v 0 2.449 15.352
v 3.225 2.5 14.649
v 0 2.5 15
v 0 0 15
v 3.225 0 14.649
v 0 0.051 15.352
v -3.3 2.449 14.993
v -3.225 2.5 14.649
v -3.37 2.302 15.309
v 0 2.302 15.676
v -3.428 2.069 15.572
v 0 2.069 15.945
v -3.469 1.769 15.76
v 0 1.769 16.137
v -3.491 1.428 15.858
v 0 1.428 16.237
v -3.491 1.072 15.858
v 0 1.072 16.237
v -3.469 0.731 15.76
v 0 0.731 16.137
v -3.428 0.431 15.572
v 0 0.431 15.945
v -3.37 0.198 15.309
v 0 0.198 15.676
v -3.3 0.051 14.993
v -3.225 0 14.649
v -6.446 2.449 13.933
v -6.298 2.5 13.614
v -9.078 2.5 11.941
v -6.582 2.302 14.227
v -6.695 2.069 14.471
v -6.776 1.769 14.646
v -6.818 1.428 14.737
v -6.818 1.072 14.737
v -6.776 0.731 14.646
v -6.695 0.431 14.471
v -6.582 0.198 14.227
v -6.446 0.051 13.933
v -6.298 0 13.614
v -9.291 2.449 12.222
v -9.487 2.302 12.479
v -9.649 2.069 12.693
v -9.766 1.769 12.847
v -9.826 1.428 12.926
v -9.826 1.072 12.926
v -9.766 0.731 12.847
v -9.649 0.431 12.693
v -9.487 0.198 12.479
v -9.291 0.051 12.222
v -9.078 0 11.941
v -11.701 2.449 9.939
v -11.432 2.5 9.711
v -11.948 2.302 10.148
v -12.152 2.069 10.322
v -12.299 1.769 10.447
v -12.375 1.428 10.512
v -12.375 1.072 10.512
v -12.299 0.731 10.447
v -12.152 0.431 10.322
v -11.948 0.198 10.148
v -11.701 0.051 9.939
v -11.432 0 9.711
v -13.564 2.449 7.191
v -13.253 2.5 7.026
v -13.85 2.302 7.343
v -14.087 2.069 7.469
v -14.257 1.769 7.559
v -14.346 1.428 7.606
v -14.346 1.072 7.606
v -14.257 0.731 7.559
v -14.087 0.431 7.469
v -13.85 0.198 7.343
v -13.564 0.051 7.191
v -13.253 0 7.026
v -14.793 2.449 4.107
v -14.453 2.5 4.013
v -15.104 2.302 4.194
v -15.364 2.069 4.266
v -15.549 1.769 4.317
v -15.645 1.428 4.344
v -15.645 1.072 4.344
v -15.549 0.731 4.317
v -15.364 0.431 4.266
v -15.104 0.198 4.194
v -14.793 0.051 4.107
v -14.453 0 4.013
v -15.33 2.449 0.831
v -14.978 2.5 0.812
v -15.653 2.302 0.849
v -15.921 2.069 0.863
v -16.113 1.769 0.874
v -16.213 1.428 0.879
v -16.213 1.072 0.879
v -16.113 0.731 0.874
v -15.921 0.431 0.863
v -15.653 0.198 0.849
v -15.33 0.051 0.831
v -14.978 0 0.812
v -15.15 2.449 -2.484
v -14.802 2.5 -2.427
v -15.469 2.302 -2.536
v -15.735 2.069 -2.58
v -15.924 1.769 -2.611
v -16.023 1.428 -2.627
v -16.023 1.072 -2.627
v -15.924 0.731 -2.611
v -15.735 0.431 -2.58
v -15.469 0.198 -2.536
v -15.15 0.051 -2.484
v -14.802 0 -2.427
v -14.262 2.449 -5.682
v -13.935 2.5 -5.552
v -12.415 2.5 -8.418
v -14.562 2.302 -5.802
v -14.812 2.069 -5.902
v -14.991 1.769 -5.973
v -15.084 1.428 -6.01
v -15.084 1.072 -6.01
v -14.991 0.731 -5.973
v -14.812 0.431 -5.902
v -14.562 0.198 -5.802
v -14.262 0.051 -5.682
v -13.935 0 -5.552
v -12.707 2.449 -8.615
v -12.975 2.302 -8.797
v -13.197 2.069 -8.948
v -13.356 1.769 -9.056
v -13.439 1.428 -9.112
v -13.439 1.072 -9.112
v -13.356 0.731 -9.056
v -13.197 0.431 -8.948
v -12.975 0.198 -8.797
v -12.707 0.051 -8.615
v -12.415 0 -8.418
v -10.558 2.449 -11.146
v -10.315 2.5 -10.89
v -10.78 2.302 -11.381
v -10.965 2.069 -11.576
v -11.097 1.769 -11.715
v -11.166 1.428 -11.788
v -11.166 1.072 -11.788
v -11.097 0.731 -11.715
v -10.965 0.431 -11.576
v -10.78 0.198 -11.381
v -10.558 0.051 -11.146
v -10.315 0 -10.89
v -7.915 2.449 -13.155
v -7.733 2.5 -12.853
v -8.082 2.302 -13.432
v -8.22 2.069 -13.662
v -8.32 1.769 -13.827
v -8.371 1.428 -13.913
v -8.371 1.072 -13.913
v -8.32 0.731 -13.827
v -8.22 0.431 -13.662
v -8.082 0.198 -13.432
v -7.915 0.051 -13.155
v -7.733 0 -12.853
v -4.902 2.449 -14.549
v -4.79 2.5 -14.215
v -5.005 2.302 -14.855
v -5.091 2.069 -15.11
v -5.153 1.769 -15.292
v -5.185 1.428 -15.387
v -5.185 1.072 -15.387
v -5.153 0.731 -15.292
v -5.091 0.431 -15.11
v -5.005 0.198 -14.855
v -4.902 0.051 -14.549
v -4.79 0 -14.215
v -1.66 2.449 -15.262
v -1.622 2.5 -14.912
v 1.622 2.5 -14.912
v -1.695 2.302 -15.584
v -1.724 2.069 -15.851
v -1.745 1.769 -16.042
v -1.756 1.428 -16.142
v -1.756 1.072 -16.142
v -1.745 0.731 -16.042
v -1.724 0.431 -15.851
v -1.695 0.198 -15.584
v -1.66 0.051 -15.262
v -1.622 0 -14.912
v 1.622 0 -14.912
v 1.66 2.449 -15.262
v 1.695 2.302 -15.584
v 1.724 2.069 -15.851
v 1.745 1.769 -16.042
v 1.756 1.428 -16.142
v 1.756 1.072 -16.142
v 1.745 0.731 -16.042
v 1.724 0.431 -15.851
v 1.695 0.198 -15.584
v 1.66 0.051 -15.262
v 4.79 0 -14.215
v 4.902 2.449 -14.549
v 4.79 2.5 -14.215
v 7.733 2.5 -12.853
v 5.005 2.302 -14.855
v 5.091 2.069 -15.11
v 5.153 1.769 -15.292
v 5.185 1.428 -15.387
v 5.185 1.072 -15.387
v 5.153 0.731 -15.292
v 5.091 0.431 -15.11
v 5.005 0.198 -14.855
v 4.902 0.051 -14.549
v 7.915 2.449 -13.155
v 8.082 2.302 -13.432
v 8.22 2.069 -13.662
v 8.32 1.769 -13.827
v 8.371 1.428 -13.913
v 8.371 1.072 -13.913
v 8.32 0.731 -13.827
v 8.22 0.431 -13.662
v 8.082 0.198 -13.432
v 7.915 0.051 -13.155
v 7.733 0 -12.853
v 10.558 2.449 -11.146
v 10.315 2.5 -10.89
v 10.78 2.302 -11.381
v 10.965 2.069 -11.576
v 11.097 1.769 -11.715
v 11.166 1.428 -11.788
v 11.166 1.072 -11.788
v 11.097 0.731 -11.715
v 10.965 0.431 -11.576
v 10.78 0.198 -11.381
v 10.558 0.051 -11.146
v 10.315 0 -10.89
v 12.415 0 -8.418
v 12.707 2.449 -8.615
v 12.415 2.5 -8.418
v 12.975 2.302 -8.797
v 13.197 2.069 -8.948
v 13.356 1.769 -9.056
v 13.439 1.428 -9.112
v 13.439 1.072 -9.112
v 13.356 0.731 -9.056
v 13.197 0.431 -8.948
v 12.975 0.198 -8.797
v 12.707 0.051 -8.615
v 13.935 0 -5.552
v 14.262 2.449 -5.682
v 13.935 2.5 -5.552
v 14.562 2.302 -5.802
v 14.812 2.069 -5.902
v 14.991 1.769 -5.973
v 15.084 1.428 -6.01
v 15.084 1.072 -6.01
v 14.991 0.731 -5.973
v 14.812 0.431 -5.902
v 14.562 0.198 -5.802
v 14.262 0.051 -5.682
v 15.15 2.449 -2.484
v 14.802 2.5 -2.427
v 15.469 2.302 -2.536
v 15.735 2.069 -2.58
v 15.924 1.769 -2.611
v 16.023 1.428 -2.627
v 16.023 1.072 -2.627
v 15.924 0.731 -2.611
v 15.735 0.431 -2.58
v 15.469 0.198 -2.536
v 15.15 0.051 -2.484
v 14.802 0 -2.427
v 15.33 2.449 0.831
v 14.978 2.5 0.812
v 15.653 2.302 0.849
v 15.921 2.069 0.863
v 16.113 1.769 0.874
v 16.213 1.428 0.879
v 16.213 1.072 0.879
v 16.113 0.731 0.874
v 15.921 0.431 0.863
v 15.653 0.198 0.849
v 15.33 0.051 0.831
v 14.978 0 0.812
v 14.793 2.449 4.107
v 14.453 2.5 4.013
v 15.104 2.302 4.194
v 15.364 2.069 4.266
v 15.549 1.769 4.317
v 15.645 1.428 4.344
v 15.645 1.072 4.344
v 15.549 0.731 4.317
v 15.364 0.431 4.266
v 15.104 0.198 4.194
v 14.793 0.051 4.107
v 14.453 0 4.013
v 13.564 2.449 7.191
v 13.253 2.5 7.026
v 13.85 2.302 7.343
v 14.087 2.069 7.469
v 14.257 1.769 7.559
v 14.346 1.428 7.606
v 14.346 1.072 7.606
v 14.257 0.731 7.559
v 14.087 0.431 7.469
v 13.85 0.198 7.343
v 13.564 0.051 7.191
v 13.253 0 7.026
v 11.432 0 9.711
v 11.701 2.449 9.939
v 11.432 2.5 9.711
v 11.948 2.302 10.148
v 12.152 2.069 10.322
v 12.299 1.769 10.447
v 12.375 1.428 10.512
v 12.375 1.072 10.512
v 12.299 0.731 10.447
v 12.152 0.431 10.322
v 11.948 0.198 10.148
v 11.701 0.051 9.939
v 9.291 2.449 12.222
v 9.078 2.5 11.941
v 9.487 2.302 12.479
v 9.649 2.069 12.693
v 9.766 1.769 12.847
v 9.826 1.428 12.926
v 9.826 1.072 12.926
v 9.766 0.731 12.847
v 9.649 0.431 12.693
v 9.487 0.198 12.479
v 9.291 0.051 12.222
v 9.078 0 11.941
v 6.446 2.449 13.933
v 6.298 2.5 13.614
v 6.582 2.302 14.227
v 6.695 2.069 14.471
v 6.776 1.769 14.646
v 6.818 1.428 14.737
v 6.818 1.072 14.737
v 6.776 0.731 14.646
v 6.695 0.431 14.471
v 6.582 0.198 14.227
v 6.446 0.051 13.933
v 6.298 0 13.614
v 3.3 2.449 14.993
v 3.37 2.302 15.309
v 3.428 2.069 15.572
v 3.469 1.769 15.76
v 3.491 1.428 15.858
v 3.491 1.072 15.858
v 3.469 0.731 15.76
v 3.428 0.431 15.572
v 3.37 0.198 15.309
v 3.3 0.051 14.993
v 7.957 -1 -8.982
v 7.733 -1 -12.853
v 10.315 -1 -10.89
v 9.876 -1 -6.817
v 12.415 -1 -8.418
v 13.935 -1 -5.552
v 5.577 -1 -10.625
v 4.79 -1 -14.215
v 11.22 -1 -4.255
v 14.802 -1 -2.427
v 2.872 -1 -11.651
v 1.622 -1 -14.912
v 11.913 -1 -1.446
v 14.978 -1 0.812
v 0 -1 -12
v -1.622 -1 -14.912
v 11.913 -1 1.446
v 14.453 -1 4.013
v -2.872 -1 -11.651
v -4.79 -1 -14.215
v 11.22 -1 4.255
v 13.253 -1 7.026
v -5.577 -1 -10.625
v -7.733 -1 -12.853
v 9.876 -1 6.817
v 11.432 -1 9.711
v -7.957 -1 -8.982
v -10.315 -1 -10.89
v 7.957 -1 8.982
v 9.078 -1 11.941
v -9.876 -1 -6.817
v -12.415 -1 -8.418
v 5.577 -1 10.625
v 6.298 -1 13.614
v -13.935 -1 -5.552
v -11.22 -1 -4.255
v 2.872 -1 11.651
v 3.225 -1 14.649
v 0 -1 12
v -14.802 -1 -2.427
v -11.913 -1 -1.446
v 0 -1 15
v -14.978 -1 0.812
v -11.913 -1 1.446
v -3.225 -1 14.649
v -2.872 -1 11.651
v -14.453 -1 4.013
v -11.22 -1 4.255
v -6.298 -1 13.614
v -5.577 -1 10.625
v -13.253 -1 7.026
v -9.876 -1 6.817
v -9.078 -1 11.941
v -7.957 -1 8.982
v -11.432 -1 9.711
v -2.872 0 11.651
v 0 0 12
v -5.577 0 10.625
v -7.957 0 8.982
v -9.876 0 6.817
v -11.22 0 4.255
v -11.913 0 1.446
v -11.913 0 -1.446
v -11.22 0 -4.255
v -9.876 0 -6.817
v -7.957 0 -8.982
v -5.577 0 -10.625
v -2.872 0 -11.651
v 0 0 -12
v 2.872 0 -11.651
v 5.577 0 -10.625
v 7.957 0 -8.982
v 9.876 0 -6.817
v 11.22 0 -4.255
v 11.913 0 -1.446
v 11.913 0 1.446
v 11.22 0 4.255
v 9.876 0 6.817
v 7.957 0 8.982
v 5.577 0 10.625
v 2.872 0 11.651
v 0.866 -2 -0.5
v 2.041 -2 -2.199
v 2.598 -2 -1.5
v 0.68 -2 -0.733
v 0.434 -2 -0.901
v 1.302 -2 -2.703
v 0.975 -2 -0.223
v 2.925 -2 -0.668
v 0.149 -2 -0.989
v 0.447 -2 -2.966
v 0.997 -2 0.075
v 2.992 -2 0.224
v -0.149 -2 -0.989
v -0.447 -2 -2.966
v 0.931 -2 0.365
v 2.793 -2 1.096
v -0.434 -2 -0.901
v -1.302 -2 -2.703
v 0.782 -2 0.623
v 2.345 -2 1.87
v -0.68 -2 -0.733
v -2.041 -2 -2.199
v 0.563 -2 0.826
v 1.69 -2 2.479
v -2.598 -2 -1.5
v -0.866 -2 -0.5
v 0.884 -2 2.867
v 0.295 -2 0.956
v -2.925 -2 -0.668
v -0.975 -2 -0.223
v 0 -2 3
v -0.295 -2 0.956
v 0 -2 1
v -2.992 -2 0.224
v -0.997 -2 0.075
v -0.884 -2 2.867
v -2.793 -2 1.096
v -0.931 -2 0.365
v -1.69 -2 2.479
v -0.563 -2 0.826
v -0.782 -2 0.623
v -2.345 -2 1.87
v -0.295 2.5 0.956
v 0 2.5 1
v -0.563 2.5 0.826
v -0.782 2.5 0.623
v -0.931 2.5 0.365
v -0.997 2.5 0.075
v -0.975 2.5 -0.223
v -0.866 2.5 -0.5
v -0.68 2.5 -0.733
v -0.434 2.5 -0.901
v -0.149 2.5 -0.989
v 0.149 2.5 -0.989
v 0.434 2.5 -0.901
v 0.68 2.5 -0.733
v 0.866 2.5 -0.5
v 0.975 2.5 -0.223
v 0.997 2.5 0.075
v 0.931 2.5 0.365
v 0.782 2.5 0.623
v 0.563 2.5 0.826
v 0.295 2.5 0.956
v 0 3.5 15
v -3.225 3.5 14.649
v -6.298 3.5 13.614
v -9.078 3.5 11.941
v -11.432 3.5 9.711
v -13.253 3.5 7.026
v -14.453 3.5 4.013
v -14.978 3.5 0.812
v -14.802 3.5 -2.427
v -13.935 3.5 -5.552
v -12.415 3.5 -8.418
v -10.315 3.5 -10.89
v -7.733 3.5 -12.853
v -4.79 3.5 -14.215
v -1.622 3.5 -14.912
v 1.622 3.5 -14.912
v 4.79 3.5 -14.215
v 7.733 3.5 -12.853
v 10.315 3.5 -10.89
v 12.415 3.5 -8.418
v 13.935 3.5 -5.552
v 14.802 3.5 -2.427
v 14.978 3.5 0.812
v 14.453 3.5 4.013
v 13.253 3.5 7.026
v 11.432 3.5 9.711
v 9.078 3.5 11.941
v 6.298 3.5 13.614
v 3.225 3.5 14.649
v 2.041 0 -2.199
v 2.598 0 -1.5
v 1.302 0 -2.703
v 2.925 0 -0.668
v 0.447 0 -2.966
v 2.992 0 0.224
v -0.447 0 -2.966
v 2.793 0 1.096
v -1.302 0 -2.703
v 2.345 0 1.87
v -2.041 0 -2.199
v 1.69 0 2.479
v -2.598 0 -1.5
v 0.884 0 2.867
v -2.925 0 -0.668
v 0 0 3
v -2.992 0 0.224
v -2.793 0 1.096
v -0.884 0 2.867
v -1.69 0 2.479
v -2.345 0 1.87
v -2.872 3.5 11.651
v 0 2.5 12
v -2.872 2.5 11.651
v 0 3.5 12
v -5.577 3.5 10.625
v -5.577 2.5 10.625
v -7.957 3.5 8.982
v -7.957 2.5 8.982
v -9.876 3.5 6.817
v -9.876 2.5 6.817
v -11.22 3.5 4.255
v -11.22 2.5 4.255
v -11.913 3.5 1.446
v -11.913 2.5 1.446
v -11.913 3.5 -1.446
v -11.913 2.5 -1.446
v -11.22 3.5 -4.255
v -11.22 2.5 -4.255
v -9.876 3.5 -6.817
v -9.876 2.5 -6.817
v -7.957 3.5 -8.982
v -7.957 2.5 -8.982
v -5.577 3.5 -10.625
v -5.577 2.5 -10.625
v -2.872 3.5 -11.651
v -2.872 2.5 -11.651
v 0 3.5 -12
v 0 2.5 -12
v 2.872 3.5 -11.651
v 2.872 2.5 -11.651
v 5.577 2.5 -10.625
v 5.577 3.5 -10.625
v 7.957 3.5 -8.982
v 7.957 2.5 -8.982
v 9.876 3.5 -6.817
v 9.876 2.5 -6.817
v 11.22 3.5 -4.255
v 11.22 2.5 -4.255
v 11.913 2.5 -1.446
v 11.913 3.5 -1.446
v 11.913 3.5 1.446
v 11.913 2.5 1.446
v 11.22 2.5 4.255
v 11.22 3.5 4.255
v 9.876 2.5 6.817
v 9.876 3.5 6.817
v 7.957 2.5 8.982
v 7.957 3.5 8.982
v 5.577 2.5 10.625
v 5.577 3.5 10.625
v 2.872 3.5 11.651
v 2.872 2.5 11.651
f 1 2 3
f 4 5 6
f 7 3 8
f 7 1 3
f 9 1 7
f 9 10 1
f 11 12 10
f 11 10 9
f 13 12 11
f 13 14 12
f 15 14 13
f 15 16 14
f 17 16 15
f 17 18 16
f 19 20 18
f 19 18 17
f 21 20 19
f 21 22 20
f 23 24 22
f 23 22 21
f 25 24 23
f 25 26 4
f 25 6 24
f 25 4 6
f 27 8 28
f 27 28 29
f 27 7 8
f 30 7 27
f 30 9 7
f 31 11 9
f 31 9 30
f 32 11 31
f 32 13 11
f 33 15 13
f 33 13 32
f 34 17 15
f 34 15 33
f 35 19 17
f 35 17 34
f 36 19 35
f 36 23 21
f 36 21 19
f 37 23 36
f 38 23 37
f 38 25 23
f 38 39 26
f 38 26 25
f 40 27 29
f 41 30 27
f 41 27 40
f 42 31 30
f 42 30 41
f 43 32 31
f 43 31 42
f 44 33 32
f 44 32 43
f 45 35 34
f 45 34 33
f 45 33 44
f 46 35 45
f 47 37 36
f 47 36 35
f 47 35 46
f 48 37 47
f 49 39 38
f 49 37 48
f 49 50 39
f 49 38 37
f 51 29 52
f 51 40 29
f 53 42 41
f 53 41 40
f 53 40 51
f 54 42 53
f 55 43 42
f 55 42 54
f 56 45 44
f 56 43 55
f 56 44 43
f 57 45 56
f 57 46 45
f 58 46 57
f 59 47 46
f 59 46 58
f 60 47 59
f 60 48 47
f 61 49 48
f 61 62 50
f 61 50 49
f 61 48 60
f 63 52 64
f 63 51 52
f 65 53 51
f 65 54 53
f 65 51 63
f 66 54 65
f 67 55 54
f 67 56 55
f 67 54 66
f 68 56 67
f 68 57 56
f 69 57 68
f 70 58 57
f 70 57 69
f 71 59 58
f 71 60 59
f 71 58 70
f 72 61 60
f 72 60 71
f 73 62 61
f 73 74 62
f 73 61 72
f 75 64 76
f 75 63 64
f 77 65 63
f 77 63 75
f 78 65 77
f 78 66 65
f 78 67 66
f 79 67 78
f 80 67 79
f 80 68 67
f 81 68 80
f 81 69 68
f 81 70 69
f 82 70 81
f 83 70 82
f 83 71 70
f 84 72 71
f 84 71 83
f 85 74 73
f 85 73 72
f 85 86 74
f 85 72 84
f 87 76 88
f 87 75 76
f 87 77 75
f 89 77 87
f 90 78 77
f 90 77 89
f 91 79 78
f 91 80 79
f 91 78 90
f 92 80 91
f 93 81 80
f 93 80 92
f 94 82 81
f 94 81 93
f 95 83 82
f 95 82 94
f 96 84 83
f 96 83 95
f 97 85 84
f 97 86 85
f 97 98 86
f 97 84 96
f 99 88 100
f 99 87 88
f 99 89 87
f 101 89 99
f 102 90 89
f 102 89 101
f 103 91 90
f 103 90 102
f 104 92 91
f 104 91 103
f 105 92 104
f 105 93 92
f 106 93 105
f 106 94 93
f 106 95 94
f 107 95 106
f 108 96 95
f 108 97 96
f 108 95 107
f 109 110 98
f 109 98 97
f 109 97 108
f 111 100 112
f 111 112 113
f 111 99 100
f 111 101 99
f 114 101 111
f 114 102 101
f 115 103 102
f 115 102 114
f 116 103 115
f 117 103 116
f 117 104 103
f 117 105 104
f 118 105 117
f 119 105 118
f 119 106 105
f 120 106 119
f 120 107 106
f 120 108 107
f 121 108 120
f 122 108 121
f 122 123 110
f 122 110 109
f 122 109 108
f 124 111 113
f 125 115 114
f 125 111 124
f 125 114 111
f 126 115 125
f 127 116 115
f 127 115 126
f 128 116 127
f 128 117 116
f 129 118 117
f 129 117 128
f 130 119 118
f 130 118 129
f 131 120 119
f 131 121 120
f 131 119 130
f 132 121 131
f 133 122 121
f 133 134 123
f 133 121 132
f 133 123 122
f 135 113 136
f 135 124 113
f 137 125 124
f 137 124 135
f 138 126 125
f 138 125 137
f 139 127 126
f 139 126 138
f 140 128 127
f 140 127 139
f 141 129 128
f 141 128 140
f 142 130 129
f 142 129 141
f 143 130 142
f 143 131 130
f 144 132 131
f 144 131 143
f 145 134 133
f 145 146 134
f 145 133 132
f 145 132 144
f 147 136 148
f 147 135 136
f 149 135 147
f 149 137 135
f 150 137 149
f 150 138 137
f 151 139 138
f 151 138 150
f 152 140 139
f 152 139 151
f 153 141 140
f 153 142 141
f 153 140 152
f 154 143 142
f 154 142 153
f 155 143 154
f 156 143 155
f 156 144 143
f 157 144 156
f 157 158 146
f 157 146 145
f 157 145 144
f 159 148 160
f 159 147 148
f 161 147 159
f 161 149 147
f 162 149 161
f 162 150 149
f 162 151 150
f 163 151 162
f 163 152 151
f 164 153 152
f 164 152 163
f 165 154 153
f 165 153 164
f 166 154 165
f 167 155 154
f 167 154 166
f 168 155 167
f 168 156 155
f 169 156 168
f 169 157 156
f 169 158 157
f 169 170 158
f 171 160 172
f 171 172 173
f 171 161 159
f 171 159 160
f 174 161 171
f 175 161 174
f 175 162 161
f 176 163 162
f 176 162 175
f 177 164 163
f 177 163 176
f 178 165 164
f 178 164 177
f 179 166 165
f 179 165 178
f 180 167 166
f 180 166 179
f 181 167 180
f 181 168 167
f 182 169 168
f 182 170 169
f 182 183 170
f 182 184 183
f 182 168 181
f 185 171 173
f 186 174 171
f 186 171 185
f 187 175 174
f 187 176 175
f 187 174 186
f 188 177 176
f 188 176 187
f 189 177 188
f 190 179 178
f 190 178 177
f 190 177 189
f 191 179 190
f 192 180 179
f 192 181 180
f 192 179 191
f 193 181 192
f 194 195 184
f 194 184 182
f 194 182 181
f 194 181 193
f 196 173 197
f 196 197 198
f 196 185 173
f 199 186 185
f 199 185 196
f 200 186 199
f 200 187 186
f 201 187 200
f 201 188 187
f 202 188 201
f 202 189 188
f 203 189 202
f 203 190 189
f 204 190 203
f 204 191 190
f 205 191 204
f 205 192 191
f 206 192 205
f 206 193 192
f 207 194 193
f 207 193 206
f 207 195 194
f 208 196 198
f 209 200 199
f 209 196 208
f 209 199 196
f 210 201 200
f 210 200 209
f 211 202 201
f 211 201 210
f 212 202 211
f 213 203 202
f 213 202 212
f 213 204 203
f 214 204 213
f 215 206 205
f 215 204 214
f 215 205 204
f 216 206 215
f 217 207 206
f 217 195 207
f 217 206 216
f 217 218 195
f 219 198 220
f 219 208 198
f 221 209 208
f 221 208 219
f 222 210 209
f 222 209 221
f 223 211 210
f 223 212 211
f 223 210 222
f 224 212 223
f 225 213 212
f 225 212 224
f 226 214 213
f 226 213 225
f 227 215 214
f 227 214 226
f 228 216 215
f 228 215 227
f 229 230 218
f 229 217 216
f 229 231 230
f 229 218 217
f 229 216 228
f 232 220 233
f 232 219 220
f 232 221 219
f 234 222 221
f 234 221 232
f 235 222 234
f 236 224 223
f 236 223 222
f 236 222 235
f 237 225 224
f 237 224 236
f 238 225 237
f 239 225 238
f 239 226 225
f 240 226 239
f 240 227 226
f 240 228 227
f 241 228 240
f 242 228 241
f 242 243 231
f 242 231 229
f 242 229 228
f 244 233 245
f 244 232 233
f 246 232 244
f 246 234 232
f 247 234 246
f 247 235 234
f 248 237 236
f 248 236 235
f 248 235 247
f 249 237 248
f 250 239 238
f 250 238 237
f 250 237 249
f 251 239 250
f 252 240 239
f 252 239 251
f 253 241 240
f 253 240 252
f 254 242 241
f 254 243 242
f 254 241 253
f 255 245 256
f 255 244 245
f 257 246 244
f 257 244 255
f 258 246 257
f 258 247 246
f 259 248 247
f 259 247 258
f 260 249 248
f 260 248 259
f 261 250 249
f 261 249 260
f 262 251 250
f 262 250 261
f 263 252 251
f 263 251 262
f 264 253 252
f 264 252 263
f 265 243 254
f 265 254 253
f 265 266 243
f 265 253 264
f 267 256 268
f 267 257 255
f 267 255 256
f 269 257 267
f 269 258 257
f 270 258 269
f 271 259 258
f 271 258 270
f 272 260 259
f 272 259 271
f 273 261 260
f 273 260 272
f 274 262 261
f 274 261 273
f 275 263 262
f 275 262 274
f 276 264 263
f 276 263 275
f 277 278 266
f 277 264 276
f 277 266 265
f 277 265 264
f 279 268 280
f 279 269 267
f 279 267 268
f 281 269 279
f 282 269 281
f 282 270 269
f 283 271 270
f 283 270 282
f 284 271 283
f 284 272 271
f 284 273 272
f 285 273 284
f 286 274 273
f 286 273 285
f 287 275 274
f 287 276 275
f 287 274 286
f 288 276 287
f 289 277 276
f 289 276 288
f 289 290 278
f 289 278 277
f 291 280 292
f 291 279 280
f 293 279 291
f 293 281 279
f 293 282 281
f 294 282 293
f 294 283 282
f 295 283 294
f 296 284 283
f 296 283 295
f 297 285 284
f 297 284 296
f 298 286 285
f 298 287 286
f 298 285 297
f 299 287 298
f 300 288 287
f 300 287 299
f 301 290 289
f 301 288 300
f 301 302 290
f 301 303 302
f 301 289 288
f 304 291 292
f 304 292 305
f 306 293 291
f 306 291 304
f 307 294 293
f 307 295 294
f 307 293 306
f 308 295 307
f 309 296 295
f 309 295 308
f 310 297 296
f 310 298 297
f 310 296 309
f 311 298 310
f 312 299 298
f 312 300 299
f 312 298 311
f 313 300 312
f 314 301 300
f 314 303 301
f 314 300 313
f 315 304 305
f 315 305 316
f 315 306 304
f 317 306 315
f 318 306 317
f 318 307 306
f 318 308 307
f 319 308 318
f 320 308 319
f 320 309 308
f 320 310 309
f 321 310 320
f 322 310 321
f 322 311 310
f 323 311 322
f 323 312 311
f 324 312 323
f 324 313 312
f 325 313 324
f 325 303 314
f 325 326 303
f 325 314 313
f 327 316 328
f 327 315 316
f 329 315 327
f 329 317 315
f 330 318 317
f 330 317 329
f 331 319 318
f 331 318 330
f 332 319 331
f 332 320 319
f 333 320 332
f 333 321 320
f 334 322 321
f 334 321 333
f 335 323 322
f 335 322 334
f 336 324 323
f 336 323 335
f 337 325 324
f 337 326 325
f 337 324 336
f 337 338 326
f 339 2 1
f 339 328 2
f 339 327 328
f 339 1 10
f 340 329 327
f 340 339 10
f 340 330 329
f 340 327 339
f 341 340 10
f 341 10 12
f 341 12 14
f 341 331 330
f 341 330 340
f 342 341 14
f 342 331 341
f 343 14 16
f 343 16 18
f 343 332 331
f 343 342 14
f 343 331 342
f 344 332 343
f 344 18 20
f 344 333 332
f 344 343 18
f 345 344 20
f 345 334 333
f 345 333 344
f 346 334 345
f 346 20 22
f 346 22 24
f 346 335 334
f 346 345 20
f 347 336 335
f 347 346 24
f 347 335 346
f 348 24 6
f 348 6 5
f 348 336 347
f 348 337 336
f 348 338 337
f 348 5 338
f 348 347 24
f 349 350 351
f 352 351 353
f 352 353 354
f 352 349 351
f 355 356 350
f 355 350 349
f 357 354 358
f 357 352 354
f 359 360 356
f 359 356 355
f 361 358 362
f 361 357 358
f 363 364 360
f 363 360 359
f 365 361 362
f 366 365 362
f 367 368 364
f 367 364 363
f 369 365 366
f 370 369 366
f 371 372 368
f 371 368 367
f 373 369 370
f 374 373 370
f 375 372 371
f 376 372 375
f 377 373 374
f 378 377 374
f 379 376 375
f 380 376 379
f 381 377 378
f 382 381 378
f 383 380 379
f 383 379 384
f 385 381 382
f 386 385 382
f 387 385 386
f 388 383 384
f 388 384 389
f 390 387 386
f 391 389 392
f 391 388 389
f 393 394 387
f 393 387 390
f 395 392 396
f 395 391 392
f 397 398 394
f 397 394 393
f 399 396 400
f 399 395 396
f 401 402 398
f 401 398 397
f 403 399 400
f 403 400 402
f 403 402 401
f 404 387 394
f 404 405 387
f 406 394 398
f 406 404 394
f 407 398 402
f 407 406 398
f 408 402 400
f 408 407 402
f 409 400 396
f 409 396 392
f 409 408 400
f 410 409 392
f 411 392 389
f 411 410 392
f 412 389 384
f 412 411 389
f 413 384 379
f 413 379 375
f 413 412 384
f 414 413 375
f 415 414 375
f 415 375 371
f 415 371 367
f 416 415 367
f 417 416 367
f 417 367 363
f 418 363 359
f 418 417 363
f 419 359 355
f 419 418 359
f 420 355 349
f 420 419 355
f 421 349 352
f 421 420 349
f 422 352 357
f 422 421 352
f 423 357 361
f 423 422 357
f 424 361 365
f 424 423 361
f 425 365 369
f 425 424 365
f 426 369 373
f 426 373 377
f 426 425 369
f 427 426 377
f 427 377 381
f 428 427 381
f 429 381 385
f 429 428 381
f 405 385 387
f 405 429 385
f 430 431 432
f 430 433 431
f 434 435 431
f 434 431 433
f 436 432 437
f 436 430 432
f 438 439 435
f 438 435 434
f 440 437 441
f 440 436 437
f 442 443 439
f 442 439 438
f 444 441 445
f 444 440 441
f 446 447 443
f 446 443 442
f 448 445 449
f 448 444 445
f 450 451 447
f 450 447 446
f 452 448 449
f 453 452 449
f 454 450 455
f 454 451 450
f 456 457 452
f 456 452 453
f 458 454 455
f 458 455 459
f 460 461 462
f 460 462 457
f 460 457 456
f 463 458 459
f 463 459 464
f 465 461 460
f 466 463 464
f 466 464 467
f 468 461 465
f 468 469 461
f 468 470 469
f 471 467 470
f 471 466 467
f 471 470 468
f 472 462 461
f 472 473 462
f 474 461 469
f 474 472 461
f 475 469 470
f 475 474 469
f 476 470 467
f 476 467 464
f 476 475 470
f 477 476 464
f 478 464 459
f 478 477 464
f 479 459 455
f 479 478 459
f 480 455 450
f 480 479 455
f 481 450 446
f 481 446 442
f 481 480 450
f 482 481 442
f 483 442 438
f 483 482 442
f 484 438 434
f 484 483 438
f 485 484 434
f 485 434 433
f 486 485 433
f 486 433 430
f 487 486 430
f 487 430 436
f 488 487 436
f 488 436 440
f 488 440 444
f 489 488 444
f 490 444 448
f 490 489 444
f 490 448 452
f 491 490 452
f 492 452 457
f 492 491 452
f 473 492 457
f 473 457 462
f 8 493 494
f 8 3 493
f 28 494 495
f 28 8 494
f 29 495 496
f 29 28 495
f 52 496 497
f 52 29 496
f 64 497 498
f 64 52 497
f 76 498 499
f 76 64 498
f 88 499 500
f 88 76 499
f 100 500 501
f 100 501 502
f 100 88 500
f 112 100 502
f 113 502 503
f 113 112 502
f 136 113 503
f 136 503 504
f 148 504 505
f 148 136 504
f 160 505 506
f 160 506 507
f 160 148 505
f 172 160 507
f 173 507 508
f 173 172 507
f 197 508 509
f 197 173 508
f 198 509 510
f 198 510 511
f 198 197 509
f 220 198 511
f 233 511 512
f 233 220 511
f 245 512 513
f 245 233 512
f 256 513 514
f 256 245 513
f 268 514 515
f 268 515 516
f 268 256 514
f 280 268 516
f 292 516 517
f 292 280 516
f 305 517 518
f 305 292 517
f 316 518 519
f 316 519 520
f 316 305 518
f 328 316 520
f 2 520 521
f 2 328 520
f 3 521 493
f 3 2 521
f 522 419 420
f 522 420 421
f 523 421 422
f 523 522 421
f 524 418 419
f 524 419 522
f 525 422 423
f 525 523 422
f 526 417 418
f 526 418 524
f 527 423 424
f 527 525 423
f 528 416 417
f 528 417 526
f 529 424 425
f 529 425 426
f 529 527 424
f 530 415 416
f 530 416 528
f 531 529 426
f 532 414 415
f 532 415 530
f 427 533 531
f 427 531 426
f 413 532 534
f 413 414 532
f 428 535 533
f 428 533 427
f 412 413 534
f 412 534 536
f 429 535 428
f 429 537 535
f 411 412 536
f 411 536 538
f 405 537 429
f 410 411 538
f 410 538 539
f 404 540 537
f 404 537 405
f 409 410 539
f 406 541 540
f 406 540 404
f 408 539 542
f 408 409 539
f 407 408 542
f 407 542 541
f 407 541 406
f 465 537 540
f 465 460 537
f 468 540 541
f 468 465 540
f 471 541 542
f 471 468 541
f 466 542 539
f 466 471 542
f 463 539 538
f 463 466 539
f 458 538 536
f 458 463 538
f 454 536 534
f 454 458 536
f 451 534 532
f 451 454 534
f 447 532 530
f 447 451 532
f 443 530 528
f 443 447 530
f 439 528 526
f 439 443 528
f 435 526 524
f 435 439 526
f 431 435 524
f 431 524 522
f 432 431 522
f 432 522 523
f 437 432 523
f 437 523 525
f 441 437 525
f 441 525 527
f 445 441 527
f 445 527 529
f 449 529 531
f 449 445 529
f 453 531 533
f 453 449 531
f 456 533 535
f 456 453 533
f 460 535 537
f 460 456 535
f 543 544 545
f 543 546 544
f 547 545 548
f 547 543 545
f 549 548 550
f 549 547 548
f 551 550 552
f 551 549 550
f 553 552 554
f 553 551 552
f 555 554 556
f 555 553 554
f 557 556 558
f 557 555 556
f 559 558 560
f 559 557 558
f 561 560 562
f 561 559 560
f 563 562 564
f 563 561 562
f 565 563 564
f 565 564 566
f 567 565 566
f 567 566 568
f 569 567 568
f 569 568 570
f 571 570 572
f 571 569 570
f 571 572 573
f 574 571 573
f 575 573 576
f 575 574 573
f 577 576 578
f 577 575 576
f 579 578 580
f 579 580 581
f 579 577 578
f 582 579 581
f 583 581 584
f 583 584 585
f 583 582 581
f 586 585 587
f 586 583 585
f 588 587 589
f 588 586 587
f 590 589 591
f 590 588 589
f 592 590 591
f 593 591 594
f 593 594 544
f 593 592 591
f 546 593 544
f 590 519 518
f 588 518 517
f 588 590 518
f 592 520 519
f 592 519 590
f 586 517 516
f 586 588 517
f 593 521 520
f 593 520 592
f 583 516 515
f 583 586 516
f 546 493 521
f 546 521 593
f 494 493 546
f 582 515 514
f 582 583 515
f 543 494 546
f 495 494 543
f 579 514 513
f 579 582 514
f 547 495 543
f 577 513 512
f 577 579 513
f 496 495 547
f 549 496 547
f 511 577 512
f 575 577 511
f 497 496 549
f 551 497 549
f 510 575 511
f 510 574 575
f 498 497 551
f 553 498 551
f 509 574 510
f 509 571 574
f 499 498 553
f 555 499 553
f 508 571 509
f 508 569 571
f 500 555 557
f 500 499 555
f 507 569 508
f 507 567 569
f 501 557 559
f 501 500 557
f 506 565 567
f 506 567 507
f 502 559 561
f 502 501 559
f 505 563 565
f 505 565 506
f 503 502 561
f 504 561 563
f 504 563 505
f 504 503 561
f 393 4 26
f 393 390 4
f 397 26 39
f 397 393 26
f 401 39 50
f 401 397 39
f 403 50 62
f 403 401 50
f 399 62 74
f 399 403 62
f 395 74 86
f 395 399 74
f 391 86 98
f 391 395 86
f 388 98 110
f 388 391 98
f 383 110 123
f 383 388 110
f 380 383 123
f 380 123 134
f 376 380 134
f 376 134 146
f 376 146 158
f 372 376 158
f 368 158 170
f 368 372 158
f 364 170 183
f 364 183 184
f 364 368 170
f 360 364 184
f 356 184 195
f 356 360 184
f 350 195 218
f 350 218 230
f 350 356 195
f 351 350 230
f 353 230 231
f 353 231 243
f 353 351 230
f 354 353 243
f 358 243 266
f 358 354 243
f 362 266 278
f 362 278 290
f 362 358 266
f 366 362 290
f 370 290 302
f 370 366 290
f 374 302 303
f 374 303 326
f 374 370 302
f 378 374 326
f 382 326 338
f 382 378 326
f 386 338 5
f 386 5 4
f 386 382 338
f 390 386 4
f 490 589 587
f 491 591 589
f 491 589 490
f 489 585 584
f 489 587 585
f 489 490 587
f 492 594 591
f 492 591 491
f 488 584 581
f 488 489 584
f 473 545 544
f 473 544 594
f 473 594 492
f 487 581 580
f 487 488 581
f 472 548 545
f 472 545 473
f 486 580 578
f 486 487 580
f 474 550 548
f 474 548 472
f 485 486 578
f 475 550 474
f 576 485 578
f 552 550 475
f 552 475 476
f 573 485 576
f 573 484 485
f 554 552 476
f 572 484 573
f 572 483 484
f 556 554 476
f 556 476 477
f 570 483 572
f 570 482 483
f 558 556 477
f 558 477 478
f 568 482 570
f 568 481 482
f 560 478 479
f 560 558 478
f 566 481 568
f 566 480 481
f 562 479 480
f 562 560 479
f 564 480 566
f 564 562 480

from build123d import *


with BuildPart() as part:
    # Sketch1 → Revolve1 (revolve)
    with BuildSketch(Plane.XY, mode=Mode.PRIVATE) as revolve1_sk:
        with BuildLine():
            Line((1, -2), (1, 2.5))
            Line((1, 2.5), (12, 2.5))
            Line((12, 2.5), (12, 3.5))
            Line((12, 3.5), (15, 3.5))
            Line((15, 3.5), (15, 2.5))
            ThreePointArc((15, 2.5), (16.25, 1.25), (15, 0))
            Line((15, 0), (15, -1))
            Line((15, -1), (12, -1))
            Line((12, -1), (12, 0))
            Line((12, 0), (3, 0))
            Line((3, 0), (3, -2))
            Line((3, -2), (1, -2))
        make_face()
    revolve(revolve1_sk.sketch.rotate(Axis((0, 26.353801269, 0), (0, -1, 0)), 90), axis=Axis((0, 26.353801269, 0), (0, -1, 0)))


solid = part.part
